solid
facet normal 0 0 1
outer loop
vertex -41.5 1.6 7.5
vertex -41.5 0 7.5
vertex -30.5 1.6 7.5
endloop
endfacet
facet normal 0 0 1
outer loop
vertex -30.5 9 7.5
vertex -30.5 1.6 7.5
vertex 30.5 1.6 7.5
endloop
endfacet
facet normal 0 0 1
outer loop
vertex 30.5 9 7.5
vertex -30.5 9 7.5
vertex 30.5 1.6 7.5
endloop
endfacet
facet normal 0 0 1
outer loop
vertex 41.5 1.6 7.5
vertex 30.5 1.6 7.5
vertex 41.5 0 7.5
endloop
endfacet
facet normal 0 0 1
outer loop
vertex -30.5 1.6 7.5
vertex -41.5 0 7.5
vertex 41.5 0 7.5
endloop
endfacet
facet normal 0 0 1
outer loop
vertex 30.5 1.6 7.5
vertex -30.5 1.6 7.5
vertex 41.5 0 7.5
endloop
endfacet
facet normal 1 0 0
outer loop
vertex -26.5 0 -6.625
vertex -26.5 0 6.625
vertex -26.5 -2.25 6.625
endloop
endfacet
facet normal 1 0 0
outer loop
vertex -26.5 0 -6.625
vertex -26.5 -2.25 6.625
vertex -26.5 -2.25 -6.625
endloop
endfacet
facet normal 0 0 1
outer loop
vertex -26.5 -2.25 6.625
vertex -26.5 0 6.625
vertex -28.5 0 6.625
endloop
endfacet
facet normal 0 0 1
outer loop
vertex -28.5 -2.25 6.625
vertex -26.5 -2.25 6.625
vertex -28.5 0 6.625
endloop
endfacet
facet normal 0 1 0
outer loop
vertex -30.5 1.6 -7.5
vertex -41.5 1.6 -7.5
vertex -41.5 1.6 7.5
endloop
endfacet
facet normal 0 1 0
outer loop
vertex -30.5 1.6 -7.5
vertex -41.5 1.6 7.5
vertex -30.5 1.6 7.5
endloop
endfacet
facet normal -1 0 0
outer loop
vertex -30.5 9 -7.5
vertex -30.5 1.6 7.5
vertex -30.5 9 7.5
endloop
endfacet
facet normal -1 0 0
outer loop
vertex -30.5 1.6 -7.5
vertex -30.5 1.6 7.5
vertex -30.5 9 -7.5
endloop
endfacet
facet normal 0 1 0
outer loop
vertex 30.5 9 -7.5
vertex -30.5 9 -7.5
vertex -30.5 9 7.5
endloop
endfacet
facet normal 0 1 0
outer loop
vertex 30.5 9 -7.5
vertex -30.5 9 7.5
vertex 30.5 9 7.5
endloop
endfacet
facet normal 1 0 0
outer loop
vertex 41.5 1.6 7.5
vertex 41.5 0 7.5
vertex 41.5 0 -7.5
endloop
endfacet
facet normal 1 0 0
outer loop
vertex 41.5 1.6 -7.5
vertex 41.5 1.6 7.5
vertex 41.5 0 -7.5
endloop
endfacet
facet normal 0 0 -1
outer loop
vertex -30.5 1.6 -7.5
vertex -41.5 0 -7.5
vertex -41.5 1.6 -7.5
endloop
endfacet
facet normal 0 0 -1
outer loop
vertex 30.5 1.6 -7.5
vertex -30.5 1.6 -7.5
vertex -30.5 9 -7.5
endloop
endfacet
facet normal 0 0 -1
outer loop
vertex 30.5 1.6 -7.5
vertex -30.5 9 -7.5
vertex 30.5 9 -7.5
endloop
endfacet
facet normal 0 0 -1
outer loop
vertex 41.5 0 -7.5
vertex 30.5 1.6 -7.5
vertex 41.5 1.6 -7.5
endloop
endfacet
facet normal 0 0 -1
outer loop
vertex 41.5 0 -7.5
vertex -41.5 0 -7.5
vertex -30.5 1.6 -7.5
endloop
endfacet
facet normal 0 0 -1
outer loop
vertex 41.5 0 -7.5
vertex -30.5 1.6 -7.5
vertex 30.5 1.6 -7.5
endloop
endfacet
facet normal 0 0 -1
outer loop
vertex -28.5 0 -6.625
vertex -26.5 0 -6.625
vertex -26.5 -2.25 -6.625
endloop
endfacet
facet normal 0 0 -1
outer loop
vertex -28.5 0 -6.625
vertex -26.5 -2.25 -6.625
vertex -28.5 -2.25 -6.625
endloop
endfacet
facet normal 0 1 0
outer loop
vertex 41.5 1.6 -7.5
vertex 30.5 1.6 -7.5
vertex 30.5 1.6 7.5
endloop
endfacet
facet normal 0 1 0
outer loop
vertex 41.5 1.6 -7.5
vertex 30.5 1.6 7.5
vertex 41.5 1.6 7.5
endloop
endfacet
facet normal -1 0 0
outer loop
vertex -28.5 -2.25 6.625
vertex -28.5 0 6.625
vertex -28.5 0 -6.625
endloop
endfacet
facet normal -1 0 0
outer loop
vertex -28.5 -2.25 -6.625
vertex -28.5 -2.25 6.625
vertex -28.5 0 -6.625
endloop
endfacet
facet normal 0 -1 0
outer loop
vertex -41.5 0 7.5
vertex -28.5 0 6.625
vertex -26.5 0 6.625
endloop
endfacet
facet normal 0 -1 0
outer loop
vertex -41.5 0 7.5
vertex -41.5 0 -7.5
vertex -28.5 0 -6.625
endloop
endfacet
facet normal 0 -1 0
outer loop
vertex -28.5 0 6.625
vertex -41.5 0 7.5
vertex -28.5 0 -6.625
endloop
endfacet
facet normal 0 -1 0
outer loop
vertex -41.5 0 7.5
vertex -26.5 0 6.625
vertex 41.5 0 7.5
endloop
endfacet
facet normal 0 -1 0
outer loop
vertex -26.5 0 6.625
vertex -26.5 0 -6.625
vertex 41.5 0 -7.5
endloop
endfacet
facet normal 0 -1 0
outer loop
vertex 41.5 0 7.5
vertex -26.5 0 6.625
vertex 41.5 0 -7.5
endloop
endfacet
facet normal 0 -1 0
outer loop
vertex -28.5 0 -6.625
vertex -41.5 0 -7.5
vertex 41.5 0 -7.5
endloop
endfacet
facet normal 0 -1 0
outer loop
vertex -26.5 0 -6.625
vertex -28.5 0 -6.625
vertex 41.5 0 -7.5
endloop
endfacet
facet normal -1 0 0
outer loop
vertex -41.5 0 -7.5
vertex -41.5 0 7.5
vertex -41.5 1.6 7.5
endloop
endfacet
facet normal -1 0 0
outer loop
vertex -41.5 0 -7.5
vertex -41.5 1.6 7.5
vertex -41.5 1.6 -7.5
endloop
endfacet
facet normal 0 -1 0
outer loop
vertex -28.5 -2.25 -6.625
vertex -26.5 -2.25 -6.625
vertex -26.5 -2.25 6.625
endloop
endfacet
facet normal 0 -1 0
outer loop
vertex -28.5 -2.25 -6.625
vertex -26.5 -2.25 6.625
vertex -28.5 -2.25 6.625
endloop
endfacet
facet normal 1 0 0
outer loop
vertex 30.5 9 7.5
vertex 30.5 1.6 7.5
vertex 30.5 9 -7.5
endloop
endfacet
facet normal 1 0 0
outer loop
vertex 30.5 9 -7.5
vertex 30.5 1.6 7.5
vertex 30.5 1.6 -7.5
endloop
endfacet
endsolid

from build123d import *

# Parameters (mm, degrees)
SKETCH1_W           = 83
SKETCH1_H           = 15
BOSS_EXTRUDE1_DEPTH = 1.6
SKETCH2_W           = 61
SKETCH2_H           = 15
BOSS_EXTRUDE2_DEPTH = 7.4
SKETCH3_W           = 2
SKETCH3_H           = 13.25
BOSS_EXTRUDE3_DEPTH = 2.25


with BuildPart() as part:
    # Sketch1 → Boss-Extrude1 (new body)
    with BuildSketch(Plane(origin=(0, 0, 0), x_dir=(1, 0, 0), z_dir=(0, 1, 0))):
        Rectangle(SKETCH1_W, SKETCH1_H)
    extrude(amount=BOSS_EXTRUDE1_DEPTH)

    # Sketch2 → Boss-Extrude2 (add)
    with BuildSketch(Plane(origin=(0, 1.6, 0), x_dir=(1, 0, 0), z_dir=(0, 1, 0))):
        Rectangle(SKETCH2_W, SKETCH2_H)
    extrude(amount=BOSS_EXTRUDE2_DEPTH)

    # Sketch3 → Boss-Extrude3 (add)
    with BuildSketch(Plane(origin=(0, 0, 0), x_dir=(-1, 0, 0), z_dir=(0, -1, 0))):
        with Locations((27.5, 0)):
            Rectangle(SKETCH3_W, SKETCH3_H)
    extrude(amount=BOSS_EXTRUDE3_DEPTH)


solid = part.part
